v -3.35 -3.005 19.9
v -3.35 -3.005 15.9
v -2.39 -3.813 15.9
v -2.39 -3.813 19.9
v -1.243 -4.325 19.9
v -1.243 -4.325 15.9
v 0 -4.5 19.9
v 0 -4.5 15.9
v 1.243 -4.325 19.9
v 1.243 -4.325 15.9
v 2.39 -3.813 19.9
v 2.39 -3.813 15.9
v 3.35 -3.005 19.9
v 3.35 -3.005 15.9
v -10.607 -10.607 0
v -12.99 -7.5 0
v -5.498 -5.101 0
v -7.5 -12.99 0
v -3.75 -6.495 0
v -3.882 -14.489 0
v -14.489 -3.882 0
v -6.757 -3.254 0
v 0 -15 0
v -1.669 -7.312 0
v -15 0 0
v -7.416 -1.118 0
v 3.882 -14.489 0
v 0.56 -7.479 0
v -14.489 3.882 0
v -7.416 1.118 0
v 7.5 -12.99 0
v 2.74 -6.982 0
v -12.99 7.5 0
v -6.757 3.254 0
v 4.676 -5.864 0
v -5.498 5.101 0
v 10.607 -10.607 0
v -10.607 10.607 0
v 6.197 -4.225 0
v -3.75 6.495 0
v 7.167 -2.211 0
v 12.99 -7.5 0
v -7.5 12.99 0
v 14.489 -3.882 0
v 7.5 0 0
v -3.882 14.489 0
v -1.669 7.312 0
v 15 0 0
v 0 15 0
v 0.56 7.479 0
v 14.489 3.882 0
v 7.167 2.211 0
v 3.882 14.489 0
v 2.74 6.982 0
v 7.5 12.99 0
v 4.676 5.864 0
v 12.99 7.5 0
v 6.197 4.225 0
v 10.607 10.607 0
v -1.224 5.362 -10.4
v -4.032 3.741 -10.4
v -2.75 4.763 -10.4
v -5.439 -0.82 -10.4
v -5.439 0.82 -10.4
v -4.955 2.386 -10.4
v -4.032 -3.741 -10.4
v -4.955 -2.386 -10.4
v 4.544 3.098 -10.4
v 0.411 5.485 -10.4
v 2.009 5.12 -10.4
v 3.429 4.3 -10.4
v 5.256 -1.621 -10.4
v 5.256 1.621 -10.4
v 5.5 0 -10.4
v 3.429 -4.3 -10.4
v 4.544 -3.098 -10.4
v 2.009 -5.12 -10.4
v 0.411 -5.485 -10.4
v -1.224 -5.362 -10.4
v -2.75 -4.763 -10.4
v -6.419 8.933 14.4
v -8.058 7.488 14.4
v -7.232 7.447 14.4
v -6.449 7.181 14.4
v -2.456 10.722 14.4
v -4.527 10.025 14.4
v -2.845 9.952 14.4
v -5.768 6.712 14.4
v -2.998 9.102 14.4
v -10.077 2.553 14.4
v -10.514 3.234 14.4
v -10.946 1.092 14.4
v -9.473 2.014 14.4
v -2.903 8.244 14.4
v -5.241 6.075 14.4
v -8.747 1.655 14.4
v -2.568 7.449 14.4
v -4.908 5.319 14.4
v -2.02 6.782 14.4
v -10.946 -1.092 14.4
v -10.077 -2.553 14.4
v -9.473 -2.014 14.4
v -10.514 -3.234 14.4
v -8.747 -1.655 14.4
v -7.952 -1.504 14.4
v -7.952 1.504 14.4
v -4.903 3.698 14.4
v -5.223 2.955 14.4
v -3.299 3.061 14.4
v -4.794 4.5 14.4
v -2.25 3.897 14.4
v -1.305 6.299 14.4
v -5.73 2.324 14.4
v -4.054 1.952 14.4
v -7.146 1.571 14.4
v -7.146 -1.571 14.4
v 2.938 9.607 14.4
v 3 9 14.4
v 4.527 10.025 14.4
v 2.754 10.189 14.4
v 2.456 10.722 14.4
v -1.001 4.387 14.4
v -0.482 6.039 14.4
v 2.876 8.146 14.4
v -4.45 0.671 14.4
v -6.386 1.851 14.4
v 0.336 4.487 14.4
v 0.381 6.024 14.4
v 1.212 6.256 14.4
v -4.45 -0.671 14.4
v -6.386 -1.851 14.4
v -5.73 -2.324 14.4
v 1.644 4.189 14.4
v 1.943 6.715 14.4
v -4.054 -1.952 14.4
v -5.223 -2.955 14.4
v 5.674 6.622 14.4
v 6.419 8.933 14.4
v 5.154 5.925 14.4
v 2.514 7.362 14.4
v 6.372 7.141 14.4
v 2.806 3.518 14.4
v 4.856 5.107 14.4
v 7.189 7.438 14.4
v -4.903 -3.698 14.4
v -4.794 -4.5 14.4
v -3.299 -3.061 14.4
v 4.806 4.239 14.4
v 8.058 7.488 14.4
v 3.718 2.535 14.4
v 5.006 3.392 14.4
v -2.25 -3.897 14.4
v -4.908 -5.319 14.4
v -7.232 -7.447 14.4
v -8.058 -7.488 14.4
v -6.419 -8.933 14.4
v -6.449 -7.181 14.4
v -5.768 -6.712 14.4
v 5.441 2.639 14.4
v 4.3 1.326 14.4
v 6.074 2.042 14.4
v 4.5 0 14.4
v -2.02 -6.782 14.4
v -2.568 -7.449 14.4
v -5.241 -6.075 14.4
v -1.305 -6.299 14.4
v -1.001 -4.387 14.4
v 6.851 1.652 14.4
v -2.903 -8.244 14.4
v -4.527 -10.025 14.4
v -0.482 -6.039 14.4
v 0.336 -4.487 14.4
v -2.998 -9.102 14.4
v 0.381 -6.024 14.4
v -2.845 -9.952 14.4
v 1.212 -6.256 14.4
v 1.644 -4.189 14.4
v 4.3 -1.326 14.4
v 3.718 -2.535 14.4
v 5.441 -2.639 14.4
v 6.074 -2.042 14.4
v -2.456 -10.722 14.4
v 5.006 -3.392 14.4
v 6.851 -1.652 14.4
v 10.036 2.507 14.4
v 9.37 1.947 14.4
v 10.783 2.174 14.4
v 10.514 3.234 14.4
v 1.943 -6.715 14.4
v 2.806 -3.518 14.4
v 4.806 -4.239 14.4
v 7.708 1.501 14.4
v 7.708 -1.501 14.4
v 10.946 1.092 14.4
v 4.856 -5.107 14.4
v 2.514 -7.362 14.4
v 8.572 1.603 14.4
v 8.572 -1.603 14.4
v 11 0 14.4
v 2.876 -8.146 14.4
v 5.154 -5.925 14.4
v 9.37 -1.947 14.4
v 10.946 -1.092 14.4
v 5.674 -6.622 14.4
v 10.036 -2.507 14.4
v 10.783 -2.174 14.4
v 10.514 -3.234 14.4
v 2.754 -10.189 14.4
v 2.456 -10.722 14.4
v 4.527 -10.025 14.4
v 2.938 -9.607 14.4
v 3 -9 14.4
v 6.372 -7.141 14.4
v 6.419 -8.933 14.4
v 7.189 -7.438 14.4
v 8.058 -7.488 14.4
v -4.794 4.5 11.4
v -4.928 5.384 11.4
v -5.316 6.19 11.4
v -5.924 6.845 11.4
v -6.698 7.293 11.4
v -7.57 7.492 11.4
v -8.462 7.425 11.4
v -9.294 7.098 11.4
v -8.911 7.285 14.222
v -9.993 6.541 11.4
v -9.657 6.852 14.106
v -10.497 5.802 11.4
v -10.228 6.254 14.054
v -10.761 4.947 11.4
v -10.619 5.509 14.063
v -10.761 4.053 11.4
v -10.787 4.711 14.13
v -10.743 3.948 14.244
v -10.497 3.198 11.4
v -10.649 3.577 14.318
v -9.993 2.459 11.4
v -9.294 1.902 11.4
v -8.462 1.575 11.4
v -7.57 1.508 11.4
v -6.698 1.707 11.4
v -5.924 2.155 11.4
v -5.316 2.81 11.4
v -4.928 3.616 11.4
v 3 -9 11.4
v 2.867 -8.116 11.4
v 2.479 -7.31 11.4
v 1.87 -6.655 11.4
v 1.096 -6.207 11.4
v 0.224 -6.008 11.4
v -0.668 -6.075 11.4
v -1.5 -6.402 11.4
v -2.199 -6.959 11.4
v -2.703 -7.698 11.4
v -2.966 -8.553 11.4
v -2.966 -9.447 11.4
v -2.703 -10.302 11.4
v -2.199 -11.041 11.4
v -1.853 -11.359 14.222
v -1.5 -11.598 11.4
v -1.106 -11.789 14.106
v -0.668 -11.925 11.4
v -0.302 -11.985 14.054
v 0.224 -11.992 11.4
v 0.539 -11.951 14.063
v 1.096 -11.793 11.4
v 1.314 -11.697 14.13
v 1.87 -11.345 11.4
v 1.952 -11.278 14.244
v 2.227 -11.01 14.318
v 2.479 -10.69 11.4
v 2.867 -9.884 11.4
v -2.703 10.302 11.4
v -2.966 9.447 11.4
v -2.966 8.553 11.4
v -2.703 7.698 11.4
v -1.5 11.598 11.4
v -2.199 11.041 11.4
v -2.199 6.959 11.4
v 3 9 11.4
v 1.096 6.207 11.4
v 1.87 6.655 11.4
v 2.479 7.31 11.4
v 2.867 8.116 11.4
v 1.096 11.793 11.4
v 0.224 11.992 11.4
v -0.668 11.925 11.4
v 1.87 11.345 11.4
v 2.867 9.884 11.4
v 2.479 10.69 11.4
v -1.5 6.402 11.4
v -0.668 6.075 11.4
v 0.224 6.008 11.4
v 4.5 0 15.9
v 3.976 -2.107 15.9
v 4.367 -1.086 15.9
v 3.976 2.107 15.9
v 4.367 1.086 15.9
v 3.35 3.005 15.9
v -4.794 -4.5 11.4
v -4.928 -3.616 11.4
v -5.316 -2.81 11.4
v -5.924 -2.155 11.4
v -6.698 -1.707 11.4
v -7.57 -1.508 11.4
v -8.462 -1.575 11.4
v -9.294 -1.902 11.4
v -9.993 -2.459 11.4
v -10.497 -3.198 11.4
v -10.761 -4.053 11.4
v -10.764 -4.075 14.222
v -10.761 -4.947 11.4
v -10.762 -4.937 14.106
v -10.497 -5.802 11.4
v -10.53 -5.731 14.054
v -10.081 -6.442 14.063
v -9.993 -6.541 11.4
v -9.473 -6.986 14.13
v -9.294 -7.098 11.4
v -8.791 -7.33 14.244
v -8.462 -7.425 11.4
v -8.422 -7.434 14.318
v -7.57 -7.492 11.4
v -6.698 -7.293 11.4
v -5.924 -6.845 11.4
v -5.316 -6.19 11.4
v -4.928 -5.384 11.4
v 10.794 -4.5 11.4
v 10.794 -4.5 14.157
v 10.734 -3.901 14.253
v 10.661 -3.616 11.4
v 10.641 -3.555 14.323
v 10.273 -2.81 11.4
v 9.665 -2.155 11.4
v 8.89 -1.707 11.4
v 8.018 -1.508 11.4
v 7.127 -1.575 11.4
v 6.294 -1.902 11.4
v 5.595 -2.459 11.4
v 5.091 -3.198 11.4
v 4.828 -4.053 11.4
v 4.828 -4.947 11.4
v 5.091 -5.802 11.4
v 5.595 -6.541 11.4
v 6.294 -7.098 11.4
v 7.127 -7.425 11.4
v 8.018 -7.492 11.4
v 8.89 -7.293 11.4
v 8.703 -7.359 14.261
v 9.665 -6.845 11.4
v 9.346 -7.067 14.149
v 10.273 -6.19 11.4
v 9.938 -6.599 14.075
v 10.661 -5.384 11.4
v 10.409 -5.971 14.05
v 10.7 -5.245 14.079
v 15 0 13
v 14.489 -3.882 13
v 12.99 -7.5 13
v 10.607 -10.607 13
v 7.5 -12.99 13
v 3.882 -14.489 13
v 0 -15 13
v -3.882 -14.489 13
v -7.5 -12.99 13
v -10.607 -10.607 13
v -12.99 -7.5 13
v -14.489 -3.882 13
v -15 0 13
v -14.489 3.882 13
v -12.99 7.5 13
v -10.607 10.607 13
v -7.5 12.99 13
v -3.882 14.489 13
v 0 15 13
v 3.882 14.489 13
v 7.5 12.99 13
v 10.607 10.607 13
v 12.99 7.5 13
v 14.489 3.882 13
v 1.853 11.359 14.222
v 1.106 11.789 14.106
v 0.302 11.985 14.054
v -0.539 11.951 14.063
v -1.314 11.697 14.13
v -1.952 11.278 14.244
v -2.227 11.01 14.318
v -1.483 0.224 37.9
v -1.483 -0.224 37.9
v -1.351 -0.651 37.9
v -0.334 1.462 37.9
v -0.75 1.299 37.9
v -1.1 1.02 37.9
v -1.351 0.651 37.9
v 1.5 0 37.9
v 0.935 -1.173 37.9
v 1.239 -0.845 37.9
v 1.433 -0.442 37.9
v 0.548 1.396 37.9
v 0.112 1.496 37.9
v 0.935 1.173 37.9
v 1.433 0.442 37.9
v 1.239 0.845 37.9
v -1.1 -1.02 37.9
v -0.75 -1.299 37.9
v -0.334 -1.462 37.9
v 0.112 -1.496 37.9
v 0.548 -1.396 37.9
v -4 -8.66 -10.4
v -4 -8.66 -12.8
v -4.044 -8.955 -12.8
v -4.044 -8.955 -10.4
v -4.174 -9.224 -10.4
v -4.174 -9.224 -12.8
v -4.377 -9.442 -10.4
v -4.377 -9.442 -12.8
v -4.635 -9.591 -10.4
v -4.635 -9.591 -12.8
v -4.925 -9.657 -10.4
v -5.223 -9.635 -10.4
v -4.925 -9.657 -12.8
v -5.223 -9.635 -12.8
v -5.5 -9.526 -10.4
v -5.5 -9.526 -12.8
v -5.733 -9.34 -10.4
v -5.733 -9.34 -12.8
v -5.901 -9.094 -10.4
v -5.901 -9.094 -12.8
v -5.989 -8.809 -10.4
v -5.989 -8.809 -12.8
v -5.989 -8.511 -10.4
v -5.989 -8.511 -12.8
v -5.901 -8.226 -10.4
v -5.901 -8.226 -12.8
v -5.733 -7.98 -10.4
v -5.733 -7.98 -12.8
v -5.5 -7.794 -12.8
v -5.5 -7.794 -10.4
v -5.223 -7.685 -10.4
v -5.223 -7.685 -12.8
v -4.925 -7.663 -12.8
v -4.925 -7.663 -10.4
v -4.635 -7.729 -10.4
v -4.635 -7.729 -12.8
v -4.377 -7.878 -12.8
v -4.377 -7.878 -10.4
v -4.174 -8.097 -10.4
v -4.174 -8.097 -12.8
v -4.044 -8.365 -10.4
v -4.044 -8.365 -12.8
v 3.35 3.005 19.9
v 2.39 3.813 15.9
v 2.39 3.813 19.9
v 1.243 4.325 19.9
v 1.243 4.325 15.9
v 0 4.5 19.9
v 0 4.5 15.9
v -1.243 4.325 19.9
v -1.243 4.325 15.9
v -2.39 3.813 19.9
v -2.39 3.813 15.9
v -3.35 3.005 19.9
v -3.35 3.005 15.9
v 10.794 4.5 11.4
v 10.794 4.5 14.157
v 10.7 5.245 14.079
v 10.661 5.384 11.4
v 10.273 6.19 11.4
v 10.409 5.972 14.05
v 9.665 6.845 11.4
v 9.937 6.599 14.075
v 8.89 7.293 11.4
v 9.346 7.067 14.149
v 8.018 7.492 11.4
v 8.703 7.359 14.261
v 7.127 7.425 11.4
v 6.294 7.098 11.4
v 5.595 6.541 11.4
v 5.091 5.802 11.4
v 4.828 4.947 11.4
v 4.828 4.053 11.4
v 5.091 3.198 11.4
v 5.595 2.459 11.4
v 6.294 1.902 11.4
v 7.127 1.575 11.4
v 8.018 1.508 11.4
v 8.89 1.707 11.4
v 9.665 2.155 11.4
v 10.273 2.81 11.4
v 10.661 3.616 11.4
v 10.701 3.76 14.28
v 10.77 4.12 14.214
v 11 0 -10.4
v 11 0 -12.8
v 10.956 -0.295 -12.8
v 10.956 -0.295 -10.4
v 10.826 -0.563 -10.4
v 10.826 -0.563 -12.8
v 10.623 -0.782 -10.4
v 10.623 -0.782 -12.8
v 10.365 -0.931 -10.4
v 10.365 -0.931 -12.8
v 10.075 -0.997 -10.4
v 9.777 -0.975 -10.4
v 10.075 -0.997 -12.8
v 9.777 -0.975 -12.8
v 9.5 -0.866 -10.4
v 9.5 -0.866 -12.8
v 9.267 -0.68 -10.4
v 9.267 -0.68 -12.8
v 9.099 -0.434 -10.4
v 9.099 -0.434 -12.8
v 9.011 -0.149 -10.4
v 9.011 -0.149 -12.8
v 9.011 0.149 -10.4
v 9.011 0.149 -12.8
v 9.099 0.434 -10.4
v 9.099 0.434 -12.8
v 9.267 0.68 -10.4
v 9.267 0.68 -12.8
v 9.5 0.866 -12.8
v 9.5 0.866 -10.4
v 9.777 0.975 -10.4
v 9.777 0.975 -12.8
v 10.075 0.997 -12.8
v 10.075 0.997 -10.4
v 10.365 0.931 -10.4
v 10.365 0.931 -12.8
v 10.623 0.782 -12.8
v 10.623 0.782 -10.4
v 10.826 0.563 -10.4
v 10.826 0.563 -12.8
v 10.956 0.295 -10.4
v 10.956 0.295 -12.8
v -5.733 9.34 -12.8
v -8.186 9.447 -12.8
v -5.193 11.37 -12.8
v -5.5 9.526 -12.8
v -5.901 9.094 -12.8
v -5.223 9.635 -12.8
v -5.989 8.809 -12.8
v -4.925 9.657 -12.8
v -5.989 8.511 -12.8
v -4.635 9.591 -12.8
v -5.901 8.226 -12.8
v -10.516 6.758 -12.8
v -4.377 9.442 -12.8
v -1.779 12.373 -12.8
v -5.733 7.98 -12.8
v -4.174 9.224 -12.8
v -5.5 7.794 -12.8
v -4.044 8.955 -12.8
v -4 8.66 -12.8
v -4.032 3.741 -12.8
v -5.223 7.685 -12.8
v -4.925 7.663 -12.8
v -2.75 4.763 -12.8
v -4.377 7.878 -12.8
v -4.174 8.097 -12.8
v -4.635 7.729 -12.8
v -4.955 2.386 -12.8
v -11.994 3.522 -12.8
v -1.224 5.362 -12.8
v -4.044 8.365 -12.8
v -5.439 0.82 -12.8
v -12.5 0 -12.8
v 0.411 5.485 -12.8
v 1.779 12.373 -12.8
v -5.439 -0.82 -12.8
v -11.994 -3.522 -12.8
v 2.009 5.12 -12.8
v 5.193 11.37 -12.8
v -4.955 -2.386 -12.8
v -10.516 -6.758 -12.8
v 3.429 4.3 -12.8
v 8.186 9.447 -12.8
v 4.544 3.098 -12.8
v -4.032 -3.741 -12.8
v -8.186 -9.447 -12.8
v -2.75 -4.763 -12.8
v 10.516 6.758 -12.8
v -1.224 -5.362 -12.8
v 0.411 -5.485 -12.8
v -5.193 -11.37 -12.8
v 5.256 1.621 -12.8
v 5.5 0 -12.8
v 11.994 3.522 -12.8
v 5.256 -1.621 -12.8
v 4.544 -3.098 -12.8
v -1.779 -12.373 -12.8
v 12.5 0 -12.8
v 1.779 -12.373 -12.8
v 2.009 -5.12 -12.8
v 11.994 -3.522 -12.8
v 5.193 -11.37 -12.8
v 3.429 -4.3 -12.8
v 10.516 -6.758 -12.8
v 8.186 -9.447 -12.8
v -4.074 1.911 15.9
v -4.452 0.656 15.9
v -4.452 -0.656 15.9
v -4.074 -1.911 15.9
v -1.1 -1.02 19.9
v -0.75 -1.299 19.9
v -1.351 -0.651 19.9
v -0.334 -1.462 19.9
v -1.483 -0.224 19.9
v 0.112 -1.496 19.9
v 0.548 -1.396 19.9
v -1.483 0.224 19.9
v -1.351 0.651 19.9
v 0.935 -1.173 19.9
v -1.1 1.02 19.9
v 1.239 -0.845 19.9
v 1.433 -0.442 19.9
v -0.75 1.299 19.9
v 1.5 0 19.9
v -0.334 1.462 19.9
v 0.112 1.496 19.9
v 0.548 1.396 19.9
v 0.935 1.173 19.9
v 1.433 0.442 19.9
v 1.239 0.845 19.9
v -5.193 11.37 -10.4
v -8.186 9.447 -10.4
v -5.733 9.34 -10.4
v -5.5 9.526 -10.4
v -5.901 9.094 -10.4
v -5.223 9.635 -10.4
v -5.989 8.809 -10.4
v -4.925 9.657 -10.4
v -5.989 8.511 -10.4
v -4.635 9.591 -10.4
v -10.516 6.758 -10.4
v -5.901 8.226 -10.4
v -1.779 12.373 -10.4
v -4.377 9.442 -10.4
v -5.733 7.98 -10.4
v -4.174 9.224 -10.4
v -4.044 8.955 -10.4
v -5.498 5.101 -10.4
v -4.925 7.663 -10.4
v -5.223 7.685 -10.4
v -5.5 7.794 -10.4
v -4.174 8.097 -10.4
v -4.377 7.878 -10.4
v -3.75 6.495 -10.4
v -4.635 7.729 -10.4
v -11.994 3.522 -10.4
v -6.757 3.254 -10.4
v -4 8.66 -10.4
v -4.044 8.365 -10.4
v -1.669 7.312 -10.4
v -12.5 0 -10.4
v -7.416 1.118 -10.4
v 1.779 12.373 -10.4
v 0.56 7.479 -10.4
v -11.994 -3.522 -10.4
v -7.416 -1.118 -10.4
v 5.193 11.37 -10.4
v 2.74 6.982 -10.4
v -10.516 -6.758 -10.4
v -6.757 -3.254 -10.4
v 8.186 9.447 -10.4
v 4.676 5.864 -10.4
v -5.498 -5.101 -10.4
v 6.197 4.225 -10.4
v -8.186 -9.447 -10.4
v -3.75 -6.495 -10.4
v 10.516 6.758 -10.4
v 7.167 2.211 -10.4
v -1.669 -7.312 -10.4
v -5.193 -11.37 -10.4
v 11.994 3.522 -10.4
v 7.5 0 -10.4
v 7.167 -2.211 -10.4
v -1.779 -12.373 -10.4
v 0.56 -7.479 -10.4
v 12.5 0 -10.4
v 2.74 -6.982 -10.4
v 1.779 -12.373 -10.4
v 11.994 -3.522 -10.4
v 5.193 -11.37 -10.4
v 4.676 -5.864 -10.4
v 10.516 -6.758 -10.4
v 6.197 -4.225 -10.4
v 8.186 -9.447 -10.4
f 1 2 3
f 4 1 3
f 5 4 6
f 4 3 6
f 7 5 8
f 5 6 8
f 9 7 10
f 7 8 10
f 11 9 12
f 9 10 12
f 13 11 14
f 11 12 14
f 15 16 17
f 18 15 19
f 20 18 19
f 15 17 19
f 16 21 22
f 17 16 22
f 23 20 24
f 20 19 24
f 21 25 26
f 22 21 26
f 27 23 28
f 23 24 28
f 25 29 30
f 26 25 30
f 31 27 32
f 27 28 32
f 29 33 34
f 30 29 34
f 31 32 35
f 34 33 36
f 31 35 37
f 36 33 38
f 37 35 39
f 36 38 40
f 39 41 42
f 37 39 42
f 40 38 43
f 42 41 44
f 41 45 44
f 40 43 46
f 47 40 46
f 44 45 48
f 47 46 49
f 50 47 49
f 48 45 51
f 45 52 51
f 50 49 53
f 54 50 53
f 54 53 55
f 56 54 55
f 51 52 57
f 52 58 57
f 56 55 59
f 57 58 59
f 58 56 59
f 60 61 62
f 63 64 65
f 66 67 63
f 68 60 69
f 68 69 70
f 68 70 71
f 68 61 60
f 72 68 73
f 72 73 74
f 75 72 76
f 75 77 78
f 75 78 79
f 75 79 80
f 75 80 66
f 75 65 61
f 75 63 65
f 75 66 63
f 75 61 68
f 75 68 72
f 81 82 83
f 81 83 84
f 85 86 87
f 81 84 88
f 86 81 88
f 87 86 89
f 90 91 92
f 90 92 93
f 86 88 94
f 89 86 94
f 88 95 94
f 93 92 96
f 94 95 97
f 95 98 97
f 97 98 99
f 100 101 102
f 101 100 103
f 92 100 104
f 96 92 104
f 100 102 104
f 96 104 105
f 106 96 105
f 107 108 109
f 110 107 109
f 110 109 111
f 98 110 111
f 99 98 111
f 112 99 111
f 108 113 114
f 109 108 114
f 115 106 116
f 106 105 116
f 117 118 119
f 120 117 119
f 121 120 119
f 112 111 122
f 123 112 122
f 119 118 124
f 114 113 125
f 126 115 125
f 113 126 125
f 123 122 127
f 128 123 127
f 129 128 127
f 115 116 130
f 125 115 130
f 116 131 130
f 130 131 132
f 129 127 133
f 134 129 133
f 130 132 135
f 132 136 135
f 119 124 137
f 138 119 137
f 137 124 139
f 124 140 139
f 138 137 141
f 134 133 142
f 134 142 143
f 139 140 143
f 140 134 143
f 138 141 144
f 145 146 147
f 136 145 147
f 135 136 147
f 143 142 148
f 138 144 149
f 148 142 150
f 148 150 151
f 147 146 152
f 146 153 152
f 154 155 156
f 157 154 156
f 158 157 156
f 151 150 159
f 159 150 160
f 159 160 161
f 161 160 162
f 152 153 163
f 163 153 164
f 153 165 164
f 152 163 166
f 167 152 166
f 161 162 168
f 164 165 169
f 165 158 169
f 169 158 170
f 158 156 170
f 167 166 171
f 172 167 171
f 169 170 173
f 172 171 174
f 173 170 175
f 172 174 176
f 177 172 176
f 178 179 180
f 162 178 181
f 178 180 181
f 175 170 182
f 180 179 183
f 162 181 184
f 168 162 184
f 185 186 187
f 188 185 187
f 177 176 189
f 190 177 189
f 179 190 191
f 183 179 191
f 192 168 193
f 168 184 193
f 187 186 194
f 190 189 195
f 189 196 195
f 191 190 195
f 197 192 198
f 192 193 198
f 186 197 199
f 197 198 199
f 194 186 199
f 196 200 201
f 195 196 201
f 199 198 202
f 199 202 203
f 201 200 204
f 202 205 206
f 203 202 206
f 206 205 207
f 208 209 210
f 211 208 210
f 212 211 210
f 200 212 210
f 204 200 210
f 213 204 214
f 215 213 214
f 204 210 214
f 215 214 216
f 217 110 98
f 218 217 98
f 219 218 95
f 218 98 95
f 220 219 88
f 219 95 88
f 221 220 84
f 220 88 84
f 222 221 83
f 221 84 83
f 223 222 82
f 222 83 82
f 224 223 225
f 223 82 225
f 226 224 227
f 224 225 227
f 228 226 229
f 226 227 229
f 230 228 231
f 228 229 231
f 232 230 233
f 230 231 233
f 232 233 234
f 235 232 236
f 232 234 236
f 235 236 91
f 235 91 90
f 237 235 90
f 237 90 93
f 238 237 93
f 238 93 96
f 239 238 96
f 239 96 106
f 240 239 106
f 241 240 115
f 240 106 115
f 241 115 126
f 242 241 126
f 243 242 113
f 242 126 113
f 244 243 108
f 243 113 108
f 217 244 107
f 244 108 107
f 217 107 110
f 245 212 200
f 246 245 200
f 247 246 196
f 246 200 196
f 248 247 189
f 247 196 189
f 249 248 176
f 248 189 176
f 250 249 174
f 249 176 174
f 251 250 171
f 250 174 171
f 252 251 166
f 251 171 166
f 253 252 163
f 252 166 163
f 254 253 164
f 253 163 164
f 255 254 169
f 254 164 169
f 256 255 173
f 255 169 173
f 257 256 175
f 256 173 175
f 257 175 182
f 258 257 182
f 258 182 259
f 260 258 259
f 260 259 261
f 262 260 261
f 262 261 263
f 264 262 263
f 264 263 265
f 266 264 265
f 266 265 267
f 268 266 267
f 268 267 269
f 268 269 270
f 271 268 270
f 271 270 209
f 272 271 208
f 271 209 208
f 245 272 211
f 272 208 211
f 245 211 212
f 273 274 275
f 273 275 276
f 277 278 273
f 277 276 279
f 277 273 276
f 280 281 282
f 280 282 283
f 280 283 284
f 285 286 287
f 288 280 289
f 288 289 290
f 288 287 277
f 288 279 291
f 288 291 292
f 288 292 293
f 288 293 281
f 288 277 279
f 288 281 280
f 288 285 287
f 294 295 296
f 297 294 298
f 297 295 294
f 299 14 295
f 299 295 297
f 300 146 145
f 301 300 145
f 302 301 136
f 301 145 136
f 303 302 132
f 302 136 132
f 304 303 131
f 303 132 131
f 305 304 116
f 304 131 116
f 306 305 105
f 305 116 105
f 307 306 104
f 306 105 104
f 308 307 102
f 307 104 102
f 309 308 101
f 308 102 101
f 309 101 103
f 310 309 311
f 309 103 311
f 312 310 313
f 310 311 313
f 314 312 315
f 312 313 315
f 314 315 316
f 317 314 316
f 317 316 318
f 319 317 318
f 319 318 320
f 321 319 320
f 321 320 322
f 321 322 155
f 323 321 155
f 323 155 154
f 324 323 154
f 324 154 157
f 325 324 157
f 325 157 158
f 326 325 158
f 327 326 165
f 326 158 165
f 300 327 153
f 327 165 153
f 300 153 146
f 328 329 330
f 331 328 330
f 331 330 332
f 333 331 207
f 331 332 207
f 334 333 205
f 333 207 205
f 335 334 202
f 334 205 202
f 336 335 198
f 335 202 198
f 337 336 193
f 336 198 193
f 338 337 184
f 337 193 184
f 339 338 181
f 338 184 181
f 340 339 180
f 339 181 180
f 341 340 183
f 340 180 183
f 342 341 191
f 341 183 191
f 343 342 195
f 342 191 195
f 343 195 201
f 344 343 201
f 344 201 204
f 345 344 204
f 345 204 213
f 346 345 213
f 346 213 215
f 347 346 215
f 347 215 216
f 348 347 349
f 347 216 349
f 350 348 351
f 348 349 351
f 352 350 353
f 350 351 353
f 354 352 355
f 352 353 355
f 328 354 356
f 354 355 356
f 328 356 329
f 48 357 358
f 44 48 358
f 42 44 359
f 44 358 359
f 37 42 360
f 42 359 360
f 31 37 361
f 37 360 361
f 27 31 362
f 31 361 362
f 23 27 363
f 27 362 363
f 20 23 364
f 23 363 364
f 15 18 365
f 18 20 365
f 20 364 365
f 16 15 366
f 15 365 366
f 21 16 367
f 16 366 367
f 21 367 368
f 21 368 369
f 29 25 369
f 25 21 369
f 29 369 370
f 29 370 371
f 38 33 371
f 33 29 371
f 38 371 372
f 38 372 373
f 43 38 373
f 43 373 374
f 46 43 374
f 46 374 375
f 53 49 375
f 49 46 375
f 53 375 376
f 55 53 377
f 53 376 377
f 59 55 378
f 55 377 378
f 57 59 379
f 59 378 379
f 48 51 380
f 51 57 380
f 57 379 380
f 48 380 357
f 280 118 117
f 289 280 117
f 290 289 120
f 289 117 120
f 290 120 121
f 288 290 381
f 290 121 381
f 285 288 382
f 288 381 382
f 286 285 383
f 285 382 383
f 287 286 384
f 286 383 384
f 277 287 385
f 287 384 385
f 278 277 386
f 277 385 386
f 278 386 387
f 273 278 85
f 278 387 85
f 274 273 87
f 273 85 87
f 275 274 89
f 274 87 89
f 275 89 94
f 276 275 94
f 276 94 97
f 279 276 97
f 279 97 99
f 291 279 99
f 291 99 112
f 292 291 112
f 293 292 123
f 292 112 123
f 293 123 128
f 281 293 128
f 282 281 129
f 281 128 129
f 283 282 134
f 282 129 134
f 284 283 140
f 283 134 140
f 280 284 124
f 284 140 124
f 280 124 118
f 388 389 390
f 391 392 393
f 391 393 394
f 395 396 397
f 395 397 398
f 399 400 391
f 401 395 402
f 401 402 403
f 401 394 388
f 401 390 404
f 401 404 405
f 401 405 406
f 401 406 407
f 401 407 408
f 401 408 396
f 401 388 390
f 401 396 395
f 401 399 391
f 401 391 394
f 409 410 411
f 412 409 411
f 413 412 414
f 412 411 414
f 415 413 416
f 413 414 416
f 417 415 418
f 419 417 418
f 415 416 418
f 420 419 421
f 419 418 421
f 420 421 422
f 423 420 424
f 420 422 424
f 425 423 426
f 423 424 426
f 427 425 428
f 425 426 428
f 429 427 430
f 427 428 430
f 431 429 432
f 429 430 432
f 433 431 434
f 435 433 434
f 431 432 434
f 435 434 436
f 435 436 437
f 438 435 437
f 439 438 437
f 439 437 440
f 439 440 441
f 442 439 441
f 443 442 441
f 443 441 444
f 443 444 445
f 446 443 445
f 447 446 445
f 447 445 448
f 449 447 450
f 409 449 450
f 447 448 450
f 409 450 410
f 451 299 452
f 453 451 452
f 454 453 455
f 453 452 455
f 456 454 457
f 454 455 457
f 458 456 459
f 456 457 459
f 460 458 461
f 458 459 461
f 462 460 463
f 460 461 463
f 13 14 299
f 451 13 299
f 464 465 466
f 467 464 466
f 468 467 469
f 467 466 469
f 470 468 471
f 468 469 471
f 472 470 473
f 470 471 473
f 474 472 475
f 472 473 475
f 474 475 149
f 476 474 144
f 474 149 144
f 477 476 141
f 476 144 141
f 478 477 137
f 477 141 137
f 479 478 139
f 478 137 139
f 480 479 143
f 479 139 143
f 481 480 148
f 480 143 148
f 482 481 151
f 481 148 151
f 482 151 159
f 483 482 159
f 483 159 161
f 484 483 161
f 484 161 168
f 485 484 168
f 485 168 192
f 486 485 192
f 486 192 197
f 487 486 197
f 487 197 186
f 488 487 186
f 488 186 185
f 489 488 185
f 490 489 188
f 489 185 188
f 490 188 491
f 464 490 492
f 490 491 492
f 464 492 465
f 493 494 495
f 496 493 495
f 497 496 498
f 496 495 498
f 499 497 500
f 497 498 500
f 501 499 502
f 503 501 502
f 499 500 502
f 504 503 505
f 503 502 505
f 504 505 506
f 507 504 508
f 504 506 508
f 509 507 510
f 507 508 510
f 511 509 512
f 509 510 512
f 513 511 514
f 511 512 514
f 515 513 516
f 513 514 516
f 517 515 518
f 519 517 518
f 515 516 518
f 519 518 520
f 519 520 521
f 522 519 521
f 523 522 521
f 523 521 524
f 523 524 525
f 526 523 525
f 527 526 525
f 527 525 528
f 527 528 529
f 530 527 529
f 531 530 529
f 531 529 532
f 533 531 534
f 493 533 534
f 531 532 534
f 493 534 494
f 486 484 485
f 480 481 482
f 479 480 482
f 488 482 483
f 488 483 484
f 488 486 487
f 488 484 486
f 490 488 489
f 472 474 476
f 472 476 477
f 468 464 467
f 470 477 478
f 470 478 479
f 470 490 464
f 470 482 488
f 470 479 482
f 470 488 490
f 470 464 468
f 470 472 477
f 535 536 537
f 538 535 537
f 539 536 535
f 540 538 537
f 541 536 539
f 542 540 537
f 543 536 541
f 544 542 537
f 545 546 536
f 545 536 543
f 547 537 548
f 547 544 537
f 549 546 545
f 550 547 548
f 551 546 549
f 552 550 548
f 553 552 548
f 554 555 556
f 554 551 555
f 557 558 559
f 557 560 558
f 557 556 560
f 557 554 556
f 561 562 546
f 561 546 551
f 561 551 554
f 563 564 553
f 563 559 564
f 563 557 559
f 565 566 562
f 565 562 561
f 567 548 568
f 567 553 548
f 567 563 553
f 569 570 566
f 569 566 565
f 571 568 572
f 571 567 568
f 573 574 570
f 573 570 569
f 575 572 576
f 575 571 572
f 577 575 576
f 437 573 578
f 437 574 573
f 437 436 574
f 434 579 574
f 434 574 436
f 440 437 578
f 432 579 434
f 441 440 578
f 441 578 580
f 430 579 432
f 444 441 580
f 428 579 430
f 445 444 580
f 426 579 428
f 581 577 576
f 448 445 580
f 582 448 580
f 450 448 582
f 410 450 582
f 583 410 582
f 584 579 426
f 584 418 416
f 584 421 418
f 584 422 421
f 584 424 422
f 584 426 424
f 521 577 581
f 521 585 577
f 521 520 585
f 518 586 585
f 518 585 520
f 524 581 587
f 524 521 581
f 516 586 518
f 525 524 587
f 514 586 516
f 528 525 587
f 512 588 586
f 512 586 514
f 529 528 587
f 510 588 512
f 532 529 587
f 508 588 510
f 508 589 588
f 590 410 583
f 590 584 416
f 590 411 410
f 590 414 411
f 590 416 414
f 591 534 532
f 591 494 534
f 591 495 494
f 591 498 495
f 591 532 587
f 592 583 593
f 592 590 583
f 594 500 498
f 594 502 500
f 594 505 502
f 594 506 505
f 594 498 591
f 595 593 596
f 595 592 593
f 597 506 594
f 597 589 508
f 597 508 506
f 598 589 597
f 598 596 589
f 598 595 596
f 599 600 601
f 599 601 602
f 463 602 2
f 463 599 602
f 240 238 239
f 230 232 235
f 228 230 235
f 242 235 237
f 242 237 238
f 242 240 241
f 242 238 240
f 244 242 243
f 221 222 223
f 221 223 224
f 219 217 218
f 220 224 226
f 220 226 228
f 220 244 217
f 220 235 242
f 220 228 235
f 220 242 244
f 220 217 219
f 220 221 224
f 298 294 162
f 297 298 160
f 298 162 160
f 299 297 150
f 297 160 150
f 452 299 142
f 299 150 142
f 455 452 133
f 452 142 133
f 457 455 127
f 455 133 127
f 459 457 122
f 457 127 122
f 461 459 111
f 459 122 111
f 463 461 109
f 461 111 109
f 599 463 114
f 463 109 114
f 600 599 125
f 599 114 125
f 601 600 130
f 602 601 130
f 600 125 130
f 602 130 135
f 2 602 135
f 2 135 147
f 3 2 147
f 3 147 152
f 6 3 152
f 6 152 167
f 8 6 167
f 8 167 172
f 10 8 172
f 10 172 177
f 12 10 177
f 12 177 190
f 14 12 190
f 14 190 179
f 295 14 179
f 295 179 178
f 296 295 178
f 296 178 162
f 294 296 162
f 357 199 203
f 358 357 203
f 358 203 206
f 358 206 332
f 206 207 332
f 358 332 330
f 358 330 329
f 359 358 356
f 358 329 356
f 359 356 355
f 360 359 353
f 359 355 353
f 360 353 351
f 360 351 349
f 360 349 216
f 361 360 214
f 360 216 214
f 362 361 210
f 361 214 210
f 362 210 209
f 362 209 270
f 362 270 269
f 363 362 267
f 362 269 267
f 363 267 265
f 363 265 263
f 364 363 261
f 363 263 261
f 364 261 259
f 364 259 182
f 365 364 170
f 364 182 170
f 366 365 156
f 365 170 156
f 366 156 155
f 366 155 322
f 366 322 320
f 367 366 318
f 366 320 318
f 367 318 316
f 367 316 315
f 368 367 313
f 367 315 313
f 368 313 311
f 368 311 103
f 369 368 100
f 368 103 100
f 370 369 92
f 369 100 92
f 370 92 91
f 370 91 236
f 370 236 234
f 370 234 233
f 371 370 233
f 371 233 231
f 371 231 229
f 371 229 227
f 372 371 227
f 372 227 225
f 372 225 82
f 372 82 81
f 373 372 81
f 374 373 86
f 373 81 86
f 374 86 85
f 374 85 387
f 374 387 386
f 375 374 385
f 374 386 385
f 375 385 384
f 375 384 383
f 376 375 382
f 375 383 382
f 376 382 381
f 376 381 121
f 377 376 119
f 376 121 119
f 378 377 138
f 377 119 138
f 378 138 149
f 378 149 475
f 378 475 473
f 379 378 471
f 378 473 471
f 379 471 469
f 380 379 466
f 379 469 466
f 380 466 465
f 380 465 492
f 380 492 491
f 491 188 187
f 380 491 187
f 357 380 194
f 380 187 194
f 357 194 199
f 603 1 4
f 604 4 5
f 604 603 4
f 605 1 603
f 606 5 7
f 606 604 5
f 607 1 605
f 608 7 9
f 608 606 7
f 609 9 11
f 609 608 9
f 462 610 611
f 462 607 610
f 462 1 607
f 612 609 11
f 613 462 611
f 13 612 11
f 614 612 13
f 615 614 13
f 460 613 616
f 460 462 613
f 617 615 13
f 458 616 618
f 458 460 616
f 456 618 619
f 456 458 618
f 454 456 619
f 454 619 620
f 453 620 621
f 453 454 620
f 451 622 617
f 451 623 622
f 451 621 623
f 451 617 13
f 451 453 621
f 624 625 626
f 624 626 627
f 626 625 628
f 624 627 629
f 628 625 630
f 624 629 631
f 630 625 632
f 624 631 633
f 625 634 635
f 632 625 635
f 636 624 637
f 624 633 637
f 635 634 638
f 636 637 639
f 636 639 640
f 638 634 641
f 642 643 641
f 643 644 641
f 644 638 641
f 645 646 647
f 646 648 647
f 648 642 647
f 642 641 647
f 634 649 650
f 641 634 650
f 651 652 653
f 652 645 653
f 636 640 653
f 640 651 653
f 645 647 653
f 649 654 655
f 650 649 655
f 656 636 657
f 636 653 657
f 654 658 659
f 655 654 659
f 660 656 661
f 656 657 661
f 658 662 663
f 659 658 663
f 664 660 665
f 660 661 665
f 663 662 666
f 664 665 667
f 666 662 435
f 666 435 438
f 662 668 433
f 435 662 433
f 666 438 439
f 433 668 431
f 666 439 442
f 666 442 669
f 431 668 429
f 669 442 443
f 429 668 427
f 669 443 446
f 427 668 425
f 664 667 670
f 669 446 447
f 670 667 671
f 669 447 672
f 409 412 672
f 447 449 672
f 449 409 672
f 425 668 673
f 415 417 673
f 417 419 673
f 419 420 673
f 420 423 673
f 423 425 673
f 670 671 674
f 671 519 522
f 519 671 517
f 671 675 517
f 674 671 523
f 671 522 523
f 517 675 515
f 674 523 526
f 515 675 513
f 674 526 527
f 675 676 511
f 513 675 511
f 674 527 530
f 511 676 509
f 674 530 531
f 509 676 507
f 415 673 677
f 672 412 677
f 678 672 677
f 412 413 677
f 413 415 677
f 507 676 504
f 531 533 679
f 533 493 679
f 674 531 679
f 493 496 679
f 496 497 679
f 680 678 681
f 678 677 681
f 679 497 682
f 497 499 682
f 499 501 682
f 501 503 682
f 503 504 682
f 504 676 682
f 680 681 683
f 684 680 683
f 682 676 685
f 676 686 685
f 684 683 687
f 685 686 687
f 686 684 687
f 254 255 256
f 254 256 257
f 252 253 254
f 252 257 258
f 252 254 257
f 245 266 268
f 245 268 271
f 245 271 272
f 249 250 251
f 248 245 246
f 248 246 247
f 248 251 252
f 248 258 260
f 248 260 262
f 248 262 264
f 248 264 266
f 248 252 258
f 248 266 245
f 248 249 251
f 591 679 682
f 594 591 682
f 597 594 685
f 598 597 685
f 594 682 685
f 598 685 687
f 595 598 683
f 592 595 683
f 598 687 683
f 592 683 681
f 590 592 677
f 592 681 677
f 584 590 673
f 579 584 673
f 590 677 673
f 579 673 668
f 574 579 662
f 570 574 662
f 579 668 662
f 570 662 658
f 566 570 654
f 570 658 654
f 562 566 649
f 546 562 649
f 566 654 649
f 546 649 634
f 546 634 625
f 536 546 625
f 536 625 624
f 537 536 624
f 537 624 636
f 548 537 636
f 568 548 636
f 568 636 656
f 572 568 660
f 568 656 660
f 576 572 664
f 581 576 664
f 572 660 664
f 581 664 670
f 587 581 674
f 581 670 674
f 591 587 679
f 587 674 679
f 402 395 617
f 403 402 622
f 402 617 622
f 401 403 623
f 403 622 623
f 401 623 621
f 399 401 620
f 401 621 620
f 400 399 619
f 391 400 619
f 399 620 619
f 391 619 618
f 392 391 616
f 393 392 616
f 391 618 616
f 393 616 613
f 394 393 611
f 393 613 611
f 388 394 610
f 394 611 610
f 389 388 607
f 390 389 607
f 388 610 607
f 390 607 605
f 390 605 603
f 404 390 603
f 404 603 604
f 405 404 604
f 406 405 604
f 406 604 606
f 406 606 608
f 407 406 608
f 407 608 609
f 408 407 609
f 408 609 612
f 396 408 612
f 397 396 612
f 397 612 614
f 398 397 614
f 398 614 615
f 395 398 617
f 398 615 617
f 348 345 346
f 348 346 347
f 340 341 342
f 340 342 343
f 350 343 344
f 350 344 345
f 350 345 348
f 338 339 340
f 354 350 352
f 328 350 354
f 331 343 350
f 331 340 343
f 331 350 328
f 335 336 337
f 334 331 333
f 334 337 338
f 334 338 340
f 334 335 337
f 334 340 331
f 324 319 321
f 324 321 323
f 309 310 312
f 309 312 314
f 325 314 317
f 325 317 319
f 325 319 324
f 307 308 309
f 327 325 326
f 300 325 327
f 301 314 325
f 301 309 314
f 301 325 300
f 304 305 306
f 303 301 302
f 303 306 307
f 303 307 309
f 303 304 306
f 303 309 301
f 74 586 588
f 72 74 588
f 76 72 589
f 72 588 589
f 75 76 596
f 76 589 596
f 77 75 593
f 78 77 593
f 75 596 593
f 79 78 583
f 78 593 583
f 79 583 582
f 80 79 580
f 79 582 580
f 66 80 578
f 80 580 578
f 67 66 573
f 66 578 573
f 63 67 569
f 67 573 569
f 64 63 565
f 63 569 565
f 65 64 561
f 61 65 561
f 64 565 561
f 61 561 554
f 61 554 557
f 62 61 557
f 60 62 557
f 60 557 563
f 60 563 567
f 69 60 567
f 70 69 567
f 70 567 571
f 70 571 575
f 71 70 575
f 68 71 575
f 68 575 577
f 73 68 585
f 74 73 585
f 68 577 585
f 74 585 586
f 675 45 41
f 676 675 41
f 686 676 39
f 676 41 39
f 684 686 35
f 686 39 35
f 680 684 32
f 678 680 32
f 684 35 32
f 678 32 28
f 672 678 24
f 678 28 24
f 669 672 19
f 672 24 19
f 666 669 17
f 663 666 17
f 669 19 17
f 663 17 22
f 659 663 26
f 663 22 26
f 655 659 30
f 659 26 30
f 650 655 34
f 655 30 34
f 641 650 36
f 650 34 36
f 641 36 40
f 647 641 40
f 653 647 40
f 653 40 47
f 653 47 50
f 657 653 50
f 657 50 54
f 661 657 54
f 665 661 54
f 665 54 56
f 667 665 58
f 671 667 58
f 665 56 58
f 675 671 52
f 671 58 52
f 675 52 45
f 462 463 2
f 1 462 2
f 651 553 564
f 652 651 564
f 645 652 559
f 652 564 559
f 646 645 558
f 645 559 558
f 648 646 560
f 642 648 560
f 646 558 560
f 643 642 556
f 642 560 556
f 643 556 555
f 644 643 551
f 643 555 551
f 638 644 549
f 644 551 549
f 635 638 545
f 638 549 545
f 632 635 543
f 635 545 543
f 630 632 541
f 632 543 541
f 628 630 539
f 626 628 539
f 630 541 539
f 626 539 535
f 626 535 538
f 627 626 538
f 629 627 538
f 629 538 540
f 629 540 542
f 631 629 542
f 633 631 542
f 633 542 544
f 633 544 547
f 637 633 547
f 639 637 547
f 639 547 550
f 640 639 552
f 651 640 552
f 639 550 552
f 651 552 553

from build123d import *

# Parameters (mm, degrees)
F0_R      = 15
F1_DEPTH  = 12
F4_R      = 3
F5_DEPTH  = 3
F6_R      = 4.5
F7_DEPTH  = 1.5
F9_DEPTH  = 4
F10_R     = 1.5
F11_DEPTH = 18
F12_R     = 7.5
F13_DEPTH = 10.4
F14_R     = 12.5
F15_DEPTH = 2.4
F16_R     = 5.5
F16_R_2   = 1
F17_DEPTH = 2.4


with BuildPart() as f1:
    # F0 (on Top) → F1 (new body)
    with BuildSketch(Plane.XY):
        Circle(F0_R)
    extrude(amount=F1_DEPTH)

    # F2 (on Front) → F3 (revolve)
    with BuildSketch(Plane.XZ):
        Polygon((11, 14.4), (0, 14.4), (0, 12), (15, 12), (15, 13), align=None)
    revolve(axis=Axis((0, 0, 13.2), (0, 0, -1)))

    # F4 (on face) → F5 (cut)
    with BuildSketch(Plane.XY.offset(14.4)):
        with Locations((0, 9)):
            Circle(F4_R)
        with Locations((-7.794229, 4.5)):
            Circle(F4_R)
        with Locations((-7.794229, -4.5)):
            Circle(F4_R)
        with Locations((0, -9)):
            Circle(F4_R)
        with Locations((7.794229, -4.5)):
            Circle(F4_R)
        with Locations((7.794229, 4.5)):
            Circle(F4_R)
    extrude(amount=-F5_DEPTH, mode=Mode.SUBTRACT)

    # F6 (on face) → F7 (join)
    with BuildSketch(Plane.XY.offset(14.4)):
        Circle(F6_R)
    extrude(amount=F7_DEPTH)

    # F8 (on face) → F9 (join)
    with BuildSketch(Plane.XY.offset(15.9)):
        with BuildLine():
            Line((3.35, -3.00458), (3.35, 3.00458))
            ThreePointArc((3.35, 3.00458), (0, 4.5), (-3.35, 3.00458))
            Line((-3.35, 3.00458), (-3.35, -3.00458))
            ThreePointArc((-3.35, -3.00458), (0, -4.5), (3.35, -3.00458))
        make_face()
    extrude(amount=F9_DEPTH)

    # F10 (on face) → F11 (join)
    with BuildSketch(Plane.XY.offset(19.9)):
        Circle(F10_R)
    extrude(amount=F11_DEPTH)

    # F12 (on face) → F13 (join)
    with BuildSketch(Plane(origin=(0, 0, 0), x_dir=(1, 0, 0), z_dir=(0, 0, -1))):
        Circle(F12_R)
    extrude(amount=F13_DEPTH)

    # F14 (on face) → F15 (join)
    with BuildSketch(Plane(origin=(0, 0, -10.4), x_dir=(1, 0, 0), z_dir=(0, 0, -1))):
        Circle(F14_R)
    extrude(amount=F15_DEPTH)

    # F16 (on face) → F17 (cut)
    with BuildSketch(Plane(origin=(0, 0, -12.8), x_dir=(1, 0, 0), z_dir=(0, 0, -1))):
        Circle(F16_R)
        with Locations((10, 0)):
            Circle(F16_R_2)
        with Locations((-5, 8.660254)):
            Circle(F16_R_2)
        with Locations((-5, -8.660254)):
            Circle(F16_R_2)
    extrude(amount=-F17_DEPTH, mode=Mode.SUBTRACT)


solid = f1.part
